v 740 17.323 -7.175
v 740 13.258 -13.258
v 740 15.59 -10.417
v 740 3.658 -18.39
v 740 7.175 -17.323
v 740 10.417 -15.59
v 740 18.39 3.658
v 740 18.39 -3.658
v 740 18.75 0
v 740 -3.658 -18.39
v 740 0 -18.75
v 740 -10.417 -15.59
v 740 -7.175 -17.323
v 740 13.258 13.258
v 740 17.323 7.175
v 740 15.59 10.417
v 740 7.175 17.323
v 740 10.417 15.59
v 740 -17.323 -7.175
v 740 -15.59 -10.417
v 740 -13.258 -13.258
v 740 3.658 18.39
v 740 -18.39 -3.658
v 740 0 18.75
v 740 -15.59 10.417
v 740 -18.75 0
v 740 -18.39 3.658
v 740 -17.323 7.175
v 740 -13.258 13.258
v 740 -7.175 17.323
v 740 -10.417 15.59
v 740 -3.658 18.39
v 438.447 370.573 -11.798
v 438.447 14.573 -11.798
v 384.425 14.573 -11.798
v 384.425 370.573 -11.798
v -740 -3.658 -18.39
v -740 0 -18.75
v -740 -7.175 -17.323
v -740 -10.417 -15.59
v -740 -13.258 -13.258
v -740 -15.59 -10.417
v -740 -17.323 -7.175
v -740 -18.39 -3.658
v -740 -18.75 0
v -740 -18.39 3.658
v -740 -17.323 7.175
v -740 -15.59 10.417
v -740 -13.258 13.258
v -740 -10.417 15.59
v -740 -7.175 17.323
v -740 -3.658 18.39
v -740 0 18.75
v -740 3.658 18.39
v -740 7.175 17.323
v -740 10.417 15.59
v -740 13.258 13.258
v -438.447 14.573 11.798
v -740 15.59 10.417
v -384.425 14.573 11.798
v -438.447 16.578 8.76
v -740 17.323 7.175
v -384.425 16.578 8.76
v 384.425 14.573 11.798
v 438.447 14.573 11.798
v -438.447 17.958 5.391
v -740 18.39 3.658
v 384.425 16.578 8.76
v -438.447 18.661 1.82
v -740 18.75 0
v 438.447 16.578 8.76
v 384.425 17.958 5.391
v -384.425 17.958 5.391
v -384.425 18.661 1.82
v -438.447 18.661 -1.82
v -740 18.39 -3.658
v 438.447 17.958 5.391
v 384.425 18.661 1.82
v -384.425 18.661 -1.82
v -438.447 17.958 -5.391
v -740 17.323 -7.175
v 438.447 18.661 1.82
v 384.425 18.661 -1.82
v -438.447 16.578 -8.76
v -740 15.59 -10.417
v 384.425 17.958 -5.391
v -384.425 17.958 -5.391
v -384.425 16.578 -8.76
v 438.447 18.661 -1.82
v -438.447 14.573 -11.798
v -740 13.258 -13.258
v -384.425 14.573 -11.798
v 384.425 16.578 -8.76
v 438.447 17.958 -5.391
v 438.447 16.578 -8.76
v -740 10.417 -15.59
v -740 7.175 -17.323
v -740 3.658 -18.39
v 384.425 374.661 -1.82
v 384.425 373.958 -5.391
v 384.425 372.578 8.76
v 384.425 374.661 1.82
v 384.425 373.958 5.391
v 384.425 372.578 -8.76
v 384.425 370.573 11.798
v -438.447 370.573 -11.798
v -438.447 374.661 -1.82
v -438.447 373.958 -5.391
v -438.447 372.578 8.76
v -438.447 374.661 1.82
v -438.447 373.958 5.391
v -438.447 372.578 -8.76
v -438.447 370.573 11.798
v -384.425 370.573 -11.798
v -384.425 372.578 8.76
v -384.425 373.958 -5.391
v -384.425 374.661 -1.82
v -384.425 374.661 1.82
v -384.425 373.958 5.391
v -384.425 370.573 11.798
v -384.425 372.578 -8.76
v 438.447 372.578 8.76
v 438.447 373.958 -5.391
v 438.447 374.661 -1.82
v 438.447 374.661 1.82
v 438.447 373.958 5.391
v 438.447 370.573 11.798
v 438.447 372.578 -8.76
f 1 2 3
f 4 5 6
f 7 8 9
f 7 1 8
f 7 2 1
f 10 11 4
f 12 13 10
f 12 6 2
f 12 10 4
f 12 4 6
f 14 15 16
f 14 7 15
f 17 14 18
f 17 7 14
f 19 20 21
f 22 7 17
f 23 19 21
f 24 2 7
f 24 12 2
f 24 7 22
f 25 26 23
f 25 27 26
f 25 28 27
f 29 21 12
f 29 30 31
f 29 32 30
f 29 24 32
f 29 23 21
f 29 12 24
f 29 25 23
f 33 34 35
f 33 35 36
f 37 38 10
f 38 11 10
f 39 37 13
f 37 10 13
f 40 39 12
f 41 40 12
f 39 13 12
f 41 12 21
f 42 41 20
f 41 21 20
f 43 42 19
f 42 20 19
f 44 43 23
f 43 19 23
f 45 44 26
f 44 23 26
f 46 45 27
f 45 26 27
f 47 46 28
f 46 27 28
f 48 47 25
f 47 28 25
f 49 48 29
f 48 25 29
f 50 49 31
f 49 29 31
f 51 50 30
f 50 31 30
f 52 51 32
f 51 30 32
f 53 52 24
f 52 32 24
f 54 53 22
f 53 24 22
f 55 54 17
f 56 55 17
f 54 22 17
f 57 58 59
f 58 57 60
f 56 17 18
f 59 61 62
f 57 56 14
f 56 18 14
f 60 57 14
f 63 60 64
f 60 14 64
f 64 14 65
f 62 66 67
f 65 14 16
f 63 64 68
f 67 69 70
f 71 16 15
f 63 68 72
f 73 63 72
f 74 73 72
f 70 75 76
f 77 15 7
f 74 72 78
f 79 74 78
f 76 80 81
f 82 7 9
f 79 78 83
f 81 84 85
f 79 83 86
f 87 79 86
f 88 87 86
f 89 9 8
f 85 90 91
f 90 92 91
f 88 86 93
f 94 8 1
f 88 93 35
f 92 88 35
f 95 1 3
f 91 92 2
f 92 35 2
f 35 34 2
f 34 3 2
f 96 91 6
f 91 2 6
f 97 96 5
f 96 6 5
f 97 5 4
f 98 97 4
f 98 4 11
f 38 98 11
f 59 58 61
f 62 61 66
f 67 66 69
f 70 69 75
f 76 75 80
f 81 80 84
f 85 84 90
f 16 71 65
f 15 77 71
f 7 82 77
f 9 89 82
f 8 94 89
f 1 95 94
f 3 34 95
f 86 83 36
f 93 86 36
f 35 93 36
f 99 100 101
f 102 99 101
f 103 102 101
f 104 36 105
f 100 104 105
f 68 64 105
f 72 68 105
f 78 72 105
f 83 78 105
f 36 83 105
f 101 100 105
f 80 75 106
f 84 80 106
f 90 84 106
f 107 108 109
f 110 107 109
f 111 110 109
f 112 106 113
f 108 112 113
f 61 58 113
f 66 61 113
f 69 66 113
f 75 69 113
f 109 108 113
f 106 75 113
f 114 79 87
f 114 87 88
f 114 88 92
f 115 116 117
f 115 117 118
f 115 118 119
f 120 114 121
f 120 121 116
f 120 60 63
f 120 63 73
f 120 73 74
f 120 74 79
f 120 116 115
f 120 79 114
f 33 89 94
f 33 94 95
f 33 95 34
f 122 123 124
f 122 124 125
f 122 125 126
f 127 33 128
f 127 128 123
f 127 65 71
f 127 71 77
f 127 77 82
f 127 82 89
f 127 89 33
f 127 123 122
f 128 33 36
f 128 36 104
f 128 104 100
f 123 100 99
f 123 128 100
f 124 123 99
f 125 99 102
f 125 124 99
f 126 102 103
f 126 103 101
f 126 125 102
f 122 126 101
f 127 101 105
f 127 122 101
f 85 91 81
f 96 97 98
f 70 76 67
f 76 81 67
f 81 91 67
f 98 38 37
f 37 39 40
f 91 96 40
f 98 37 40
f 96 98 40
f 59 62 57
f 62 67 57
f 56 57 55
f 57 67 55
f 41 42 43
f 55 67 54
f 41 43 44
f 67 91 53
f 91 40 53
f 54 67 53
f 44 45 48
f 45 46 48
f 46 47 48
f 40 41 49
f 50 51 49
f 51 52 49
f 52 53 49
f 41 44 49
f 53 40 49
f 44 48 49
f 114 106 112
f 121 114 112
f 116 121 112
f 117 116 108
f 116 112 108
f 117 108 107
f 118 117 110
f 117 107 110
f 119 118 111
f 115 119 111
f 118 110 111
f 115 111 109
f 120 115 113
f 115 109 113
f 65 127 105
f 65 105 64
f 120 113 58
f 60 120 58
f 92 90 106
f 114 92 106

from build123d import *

# Parameters (mm, degrees)
SKETCH1_W           = 1480
SKETCH1_H           = 18.75
BOSS_EXTRUDE2_START = -438.446590399
BOSS_EXTRUDE2_DEPTH = 54.021923435


# Read off the part's stored shape, not the designer's step: Boss-Extrude2
with BuildPart() as part:
    # Sketch1 → Revolve1 (revolve)
    with BuildSketch(Plane(origin=(0, 0, 0), x_dir=(1, 0, 0), z_dir=(0, 1, 0))):
        with Locations((0, 9.375)):
            Rectangle(SKETCH1_W, SKETCH1_H)
    revolve(axis=Axis((270.12195122, 0, 0), (-1, 0, 0)))

    # Boss-Extrude2 outline → Boss-Extrude2 (add)
    with BuildSketch(Plane.YZ.offset(BOSS_EXTRUDE2_START)):
        with BuildLine():
            Line((14.573043819, -11.797834286), (370.573043819, -11.797834286))
            ThreePointArc((370.573043819, -11.797834286), (374.75, 0), (370.573043819, 11.797834286))
            Line((370.573043819, 11.797834286), (14.573043819, 11.797834286))
            ThreePointArc((14.573043819, 11.797834286), (18.75, 0), (14.573043819, -11.797834286))
        make_face()
    boss_extrude2 = extrude(amount=BOSS_EXTRUDE2_DEPTH)

    # Mirror1: Boss-Extrude2 across plane
    add(boss_extrude2.mirror(Plane(origin=(0, 0, 0), x_dir=(0, 0, 1), z_dir=(1, 0, 0))))


solid = part.part
